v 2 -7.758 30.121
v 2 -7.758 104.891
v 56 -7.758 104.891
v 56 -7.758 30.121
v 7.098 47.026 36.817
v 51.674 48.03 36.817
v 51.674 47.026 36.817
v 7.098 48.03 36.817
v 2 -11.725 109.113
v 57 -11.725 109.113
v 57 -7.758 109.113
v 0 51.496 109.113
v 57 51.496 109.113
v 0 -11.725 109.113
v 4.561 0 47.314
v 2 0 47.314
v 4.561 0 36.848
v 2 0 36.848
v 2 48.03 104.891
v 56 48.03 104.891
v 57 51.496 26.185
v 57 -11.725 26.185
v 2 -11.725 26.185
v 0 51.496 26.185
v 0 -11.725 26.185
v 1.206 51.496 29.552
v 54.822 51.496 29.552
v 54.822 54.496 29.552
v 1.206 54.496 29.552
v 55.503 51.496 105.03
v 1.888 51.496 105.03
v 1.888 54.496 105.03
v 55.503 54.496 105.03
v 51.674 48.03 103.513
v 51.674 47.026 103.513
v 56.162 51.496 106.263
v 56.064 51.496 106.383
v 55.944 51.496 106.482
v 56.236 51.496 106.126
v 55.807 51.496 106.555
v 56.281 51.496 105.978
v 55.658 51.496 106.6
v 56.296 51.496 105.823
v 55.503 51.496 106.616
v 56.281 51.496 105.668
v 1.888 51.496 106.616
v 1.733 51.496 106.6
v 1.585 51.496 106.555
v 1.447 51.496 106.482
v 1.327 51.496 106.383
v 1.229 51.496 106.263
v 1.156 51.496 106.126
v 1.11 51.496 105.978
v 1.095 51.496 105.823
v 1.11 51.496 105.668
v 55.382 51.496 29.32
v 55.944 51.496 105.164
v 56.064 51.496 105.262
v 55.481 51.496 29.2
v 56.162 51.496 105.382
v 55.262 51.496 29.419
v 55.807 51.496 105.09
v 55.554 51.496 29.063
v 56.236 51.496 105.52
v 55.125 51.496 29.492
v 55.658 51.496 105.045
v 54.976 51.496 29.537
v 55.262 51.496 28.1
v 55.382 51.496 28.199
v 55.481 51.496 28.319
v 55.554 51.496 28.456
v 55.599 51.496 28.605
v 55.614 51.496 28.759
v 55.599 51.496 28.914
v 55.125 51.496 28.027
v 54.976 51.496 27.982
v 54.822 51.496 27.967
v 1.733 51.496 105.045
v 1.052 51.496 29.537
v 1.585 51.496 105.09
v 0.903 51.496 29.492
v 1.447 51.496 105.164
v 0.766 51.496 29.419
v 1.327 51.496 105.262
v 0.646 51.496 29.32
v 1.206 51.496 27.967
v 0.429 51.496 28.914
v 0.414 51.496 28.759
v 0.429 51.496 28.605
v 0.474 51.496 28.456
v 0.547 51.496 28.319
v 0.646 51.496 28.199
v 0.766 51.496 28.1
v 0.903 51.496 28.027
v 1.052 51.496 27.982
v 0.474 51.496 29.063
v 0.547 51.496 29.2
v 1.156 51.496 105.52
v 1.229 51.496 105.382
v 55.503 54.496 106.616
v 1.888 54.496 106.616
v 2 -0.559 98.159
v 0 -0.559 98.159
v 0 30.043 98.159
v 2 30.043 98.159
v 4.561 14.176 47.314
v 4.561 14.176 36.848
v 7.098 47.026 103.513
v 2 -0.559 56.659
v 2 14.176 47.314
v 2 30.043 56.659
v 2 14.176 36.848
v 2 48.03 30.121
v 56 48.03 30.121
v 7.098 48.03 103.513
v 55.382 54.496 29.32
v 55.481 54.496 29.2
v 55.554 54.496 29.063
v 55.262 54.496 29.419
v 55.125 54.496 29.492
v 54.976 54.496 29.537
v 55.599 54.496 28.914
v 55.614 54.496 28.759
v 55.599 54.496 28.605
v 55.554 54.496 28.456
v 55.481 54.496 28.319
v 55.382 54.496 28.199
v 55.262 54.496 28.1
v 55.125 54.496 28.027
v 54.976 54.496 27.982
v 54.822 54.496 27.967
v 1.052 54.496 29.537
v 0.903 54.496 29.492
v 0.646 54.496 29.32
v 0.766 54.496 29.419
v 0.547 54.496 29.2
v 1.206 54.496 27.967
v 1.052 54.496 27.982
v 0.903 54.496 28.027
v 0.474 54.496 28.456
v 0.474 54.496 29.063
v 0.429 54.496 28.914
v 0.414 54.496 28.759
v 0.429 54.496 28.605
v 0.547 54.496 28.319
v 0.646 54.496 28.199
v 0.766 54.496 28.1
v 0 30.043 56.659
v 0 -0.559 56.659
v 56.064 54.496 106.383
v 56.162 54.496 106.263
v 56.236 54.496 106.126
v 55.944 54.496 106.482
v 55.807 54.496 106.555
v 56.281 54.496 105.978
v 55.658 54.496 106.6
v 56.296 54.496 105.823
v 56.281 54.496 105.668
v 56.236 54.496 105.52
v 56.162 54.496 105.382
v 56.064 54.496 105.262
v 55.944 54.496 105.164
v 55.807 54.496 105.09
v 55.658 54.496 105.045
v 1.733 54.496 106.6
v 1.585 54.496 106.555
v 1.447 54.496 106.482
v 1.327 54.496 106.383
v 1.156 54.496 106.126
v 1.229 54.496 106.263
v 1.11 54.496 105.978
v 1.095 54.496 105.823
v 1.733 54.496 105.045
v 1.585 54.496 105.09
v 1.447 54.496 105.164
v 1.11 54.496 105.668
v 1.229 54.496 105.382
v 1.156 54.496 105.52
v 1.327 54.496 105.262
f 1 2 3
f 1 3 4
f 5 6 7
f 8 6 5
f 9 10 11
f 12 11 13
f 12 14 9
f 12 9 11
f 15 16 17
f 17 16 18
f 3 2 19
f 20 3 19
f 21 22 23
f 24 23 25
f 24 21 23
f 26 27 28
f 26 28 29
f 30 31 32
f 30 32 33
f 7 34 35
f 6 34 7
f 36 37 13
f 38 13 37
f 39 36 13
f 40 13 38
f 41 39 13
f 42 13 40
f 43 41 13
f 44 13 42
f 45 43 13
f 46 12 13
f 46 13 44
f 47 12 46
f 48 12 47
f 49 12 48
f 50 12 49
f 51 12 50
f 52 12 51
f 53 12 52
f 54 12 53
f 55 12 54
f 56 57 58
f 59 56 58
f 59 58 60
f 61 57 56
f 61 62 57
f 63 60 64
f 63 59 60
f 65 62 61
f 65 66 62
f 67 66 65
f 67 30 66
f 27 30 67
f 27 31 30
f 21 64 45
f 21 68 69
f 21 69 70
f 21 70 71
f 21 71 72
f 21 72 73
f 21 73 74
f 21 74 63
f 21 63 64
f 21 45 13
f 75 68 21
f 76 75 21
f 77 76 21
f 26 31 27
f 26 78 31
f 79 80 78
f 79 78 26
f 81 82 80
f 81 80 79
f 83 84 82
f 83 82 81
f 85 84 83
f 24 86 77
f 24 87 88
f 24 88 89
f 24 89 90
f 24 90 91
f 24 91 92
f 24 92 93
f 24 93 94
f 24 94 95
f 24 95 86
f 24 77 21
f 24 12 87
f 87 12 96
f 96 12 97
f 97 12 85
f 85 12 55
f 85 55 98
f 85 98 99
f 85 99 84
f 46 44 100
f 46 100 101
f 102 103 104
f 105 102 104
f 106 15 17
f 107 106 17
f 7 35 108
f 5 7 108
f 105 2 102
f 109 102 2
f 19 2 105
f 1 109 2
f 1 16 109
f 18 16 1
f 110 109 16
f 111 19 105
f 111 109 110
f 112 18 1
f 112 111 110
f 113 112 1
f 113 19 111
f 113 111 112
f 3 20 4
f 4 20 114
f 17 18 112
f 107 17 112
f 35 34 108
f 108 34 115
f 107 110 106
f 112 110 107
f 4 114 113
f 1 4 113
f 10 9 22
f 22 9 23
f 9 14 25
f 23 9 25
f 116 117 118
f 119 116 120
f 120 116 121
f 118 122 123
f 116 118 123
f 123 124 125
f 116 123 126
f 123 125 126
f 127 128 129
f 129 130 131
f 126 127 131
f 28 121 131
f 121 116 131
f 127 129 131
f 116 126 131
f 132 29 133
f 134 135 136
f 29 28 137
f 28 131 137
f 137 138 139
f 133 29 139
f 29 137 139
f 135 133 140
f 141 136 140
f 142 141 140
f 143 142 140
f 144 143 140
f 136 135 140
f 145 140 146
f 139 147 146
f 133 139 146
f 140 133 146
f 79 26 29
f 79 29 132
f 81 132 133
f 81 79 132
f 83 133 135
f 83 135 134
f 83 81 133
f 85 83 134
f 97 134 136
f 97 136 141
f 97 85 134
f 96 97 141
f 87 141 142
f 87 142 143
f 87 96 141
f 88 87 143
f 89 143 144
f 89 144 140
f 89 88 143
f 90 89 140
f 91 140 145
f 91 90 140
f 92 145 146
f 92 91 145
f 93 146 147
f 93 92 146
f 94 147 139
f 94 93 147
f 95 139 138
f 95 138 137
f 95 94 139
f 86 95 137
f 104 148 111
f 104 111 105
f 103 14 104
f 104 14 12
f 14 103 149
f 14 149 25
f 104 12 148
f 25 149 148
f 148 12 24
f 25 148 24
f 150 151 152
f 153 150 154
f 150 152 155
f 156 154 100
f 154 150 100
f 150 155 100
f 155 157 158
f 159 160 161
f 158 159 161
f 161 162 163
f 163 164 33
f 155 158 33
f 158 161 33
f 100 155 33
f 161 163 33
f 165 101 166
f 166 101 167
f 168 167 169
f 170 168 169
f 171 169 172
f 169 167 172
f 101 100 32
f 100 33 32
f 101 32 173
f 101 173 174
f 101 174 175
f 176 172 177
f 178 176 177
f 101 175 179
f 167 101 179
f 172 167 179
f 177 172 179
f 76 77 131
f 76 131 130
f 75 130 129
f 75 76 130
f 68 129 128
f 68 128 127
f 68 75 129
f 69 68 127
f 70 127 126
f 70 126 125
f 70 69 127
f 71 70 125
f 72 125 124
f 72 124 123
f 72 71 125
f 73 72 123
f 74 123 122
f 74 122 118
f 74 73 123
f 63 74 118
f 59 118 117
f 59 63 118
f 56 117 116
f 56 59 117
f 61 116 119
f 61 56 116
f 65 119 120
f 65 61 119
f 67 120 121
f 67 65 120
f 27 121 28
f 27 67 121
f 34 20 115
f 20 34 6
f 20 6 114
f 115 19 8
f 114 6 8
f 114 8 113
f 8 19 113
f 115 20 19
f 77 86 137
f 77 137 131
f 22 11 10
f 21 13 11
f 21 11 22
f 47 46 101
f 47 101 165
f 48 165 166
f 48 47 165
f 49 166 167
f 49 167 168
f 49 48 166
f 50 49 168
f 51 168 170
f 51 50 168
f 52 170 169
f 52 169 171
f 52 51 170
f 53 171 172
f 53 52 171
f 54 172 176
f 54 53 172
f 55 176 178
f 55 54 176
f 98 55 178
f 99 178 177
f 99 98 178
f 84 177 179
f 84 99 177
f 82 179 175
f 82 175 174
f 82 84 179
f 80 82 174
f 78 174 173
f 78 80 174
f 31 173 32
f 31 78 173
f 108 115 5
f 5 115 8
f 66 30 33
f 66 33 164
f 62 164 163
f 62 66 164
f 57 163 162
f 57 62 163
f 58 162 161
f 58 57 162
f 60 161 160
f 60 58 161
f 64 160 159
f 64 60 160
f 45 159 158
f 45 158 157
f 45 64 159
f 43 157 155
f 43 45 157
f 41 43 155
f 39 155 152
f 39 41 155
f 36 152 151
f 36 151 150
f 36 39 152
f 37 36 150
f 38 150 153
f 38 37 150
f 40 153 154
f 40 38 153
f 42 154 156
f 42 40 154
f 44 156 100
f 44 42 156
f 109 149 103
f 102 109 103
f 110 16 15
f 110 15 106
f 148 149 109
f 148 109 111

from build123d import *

# Parameters (mm, degrees)
SKETCH1_W           = 82.927984002
SKETCH1_H           = 63.220938657
BOSS_EXTRUDE1_DEPTH = 2
SKETCH2_W           = 82.927984002
SKETCH2_H           = 3.465808433
BOSS_EXTRUDE2_DEPTH = 55
SKETCH3_W           = 82.927984002
SKETCH3_H           = 3.967313271
BOSS_EXTRUDE3_DEPTH = 55
SKETCH4_W           = 4.221872701
SKETCH4_H           = 55.787816953
BOSS_EXTRUDE4_DEPTH = 55
SKETCH5_W           = 55
SKETCH5_H           = 3.935807591
BOSS_EXTRUDE5_DEPTH = 59
SKETCH6_W           = 41.500434797
SKETCH6_H           = 30.602093287
CUT_EXTRUDE1_DEPTH  = 59
SKETCH7_W           = 44.576665198
SKETCH7_H           = 66.696896342
BOSS_EXTRUDE6_DEPTH = 1.00351002
SKETCH8_W           = 10.465984431
SKETCH8_H           = 14.175880316
BOSS_EXTRUDE7_DEPTH = 2.561499725
BOSS_EXTRUDE8_DEPTH = 3
SKETCH13_W          = 82.927984002
SKETCH13_H          = 63.220938657
BOSS_EXTRUDE9_DEPTH = 1


with BuildPart() as part:
    # Sketch1 → Boss-Extrude1 (new body)
    with BuildSketch(Plane(origin=(0, 0, 0), x_dir=(0, 0, -1), z_dir=(1, 0, 0))):
        with Locations((-67.649308223, 19.885127524)):
            Rectangle(SKETCH1_W, SKETCH1_H)
    extrude(amount=BOSS_EXTRUDE1_DEPTH)

    # Sketch2 → Boss-Extrude2 (add)
    with BuildSketch(Plane(origin=(2, 0, 0), x_dir=(0, 0, -1), z_dir=(1, 0, 0))):
        with Locations((-67.649308223, 49.762692636)):
            Rectangle(SKETCH2_W, SKETCH2_H)
    extrude(amount=BOSS_EXTRUDE2_DEPTH)

    # Sketch3 → Boss-Extrude3 (add)
    with BuildSketch(Plane(origin=(2, 0, 0), x_dir=(0, 0, -1), z_dir=(1, 0, 0))):
        with Locations((-67.649308223, -9.74168517)):
            Rectangle(SKETCH3_W, SKETCH3_H)
    extrude(amount=BOSS_EXTRUDE3_DEPTH)

    # Sketch4 → Boss-Extrude4 (add)
    with BuildSketch(Plane(origin=(2, 0, 0), x_dir=(0, 0, -1), z_dir=(1, 0, 0))):
        with Locations((-107.002363874, 20.135879943)):
            Rectangle(SKETCH4_W, SKETCH4_H)
    extrude(amount=BOSS_EXTRUDE4_DEPTH)

    # Sketch5 → Boss-Extrude5 (add)
    with BuildSketch(Plane(origin=(0, 48.029788419, 0), x_dir=(-1, 0, 0), z_dir=(0, -1, 0))):
        with Locations((-29.5, -28.153220018)):
            Rectangle(SKETCH5_W, SKETCH5_H)
    extrude(amount=BOSS_EXTRUDE5_DEPTH)

    # Sketch6 → Cut-Extrude1 (cut)
    with BuildSketch(Plane.ZY):
        with Locations((77.408781478, 14.741773436)):
            Rectangle(SKETCH6_W, SKETCH6_H)
    extrude(amount=-CUT_EXTRUDE1_DEPTH, mode=Mode.SUBTRACT)

    # Sketch7 → Boss-Extrude6 (add)
    with BuildSketch(Plane(origin=(0, 48.029788419, -1.234575524), x_dir=(-1, 0, 0), z_dir=(0, -1, 0))):
        with Locations((-29.385955108, -71.399525652)):
            Rectangle(SKETCH7_W, SKETCH7_H)
    extrude(amount=BOSS_EXTRUDE6_DEPTH)

    # Sketch8 → Boss-Extrude7 (add)
    with BuildSketch(Plane(origin=(2, 0, -3.365196523), x_dir=(0, 0, -1), z_dir=(1, 0, 0))):
        with Locations((-45.445727025, 7.087940158)):
            Rectangle(SKETCH8_W, SKETCH8_H)
    extrude(amount=BOSS_EXTRUDE7_DEPTH)

    # Sketch9 → Boss-Extrude8 (add)
    with BuildSketch(Plane(origin=(0, 51.495596852, 0), x_dir=(1, 0, 0), z_dir=(0, 1, 0))):
        with BuildLine():
            Line((1.887912496, -105.030139818), (55.50324265, -105.030139818))
            ThreePointArc((55.50324265, -105.030139818), (56.295978023, -105.822875191), (55.50324265, -106.615610564))
            Line((55.50324265, -106.615610564), (1.887912496, -106.615610564))
            ThreePointArc((1.887912496, -106.615610564), (1.095177123, -105.822875191), (1.887912496, -105.030139818))
        make_face()
        with BuildLine():
            Line((1.206362126, -27.966631884), (54.82169228, -27.966631884))
            ThreePointArc((54.82169228, -27.966631884), (55.614427653, -28.759367257), (54.82169228, -29.552102629))
            Line((54.82169228, -29.552102629), (1.206362126, -29.552102629))
            ThreePointArc((1.206362126, -29.552102629), (0.413626753, -28.759367257), (1.206362126, -27.966631884))
        make_face()
    extrude(amount=BOSS_EXTRUDE8_DEPTH)

    # Sketch13 → Boss-Extrude9 (add)
    with BuildSketch(Plane(origin=(57, 0, 0), x_dir=(0, 0, -1), z_dir=(1, 0, 0))):
        with Locations((-67.649308223, 19.885127524)):
            Rectangle(SKETCH13_W, SKETCH13_H)
    extrude(amount=-BOSS_EXTRUDE9_DEPTH)


solid = part.part
